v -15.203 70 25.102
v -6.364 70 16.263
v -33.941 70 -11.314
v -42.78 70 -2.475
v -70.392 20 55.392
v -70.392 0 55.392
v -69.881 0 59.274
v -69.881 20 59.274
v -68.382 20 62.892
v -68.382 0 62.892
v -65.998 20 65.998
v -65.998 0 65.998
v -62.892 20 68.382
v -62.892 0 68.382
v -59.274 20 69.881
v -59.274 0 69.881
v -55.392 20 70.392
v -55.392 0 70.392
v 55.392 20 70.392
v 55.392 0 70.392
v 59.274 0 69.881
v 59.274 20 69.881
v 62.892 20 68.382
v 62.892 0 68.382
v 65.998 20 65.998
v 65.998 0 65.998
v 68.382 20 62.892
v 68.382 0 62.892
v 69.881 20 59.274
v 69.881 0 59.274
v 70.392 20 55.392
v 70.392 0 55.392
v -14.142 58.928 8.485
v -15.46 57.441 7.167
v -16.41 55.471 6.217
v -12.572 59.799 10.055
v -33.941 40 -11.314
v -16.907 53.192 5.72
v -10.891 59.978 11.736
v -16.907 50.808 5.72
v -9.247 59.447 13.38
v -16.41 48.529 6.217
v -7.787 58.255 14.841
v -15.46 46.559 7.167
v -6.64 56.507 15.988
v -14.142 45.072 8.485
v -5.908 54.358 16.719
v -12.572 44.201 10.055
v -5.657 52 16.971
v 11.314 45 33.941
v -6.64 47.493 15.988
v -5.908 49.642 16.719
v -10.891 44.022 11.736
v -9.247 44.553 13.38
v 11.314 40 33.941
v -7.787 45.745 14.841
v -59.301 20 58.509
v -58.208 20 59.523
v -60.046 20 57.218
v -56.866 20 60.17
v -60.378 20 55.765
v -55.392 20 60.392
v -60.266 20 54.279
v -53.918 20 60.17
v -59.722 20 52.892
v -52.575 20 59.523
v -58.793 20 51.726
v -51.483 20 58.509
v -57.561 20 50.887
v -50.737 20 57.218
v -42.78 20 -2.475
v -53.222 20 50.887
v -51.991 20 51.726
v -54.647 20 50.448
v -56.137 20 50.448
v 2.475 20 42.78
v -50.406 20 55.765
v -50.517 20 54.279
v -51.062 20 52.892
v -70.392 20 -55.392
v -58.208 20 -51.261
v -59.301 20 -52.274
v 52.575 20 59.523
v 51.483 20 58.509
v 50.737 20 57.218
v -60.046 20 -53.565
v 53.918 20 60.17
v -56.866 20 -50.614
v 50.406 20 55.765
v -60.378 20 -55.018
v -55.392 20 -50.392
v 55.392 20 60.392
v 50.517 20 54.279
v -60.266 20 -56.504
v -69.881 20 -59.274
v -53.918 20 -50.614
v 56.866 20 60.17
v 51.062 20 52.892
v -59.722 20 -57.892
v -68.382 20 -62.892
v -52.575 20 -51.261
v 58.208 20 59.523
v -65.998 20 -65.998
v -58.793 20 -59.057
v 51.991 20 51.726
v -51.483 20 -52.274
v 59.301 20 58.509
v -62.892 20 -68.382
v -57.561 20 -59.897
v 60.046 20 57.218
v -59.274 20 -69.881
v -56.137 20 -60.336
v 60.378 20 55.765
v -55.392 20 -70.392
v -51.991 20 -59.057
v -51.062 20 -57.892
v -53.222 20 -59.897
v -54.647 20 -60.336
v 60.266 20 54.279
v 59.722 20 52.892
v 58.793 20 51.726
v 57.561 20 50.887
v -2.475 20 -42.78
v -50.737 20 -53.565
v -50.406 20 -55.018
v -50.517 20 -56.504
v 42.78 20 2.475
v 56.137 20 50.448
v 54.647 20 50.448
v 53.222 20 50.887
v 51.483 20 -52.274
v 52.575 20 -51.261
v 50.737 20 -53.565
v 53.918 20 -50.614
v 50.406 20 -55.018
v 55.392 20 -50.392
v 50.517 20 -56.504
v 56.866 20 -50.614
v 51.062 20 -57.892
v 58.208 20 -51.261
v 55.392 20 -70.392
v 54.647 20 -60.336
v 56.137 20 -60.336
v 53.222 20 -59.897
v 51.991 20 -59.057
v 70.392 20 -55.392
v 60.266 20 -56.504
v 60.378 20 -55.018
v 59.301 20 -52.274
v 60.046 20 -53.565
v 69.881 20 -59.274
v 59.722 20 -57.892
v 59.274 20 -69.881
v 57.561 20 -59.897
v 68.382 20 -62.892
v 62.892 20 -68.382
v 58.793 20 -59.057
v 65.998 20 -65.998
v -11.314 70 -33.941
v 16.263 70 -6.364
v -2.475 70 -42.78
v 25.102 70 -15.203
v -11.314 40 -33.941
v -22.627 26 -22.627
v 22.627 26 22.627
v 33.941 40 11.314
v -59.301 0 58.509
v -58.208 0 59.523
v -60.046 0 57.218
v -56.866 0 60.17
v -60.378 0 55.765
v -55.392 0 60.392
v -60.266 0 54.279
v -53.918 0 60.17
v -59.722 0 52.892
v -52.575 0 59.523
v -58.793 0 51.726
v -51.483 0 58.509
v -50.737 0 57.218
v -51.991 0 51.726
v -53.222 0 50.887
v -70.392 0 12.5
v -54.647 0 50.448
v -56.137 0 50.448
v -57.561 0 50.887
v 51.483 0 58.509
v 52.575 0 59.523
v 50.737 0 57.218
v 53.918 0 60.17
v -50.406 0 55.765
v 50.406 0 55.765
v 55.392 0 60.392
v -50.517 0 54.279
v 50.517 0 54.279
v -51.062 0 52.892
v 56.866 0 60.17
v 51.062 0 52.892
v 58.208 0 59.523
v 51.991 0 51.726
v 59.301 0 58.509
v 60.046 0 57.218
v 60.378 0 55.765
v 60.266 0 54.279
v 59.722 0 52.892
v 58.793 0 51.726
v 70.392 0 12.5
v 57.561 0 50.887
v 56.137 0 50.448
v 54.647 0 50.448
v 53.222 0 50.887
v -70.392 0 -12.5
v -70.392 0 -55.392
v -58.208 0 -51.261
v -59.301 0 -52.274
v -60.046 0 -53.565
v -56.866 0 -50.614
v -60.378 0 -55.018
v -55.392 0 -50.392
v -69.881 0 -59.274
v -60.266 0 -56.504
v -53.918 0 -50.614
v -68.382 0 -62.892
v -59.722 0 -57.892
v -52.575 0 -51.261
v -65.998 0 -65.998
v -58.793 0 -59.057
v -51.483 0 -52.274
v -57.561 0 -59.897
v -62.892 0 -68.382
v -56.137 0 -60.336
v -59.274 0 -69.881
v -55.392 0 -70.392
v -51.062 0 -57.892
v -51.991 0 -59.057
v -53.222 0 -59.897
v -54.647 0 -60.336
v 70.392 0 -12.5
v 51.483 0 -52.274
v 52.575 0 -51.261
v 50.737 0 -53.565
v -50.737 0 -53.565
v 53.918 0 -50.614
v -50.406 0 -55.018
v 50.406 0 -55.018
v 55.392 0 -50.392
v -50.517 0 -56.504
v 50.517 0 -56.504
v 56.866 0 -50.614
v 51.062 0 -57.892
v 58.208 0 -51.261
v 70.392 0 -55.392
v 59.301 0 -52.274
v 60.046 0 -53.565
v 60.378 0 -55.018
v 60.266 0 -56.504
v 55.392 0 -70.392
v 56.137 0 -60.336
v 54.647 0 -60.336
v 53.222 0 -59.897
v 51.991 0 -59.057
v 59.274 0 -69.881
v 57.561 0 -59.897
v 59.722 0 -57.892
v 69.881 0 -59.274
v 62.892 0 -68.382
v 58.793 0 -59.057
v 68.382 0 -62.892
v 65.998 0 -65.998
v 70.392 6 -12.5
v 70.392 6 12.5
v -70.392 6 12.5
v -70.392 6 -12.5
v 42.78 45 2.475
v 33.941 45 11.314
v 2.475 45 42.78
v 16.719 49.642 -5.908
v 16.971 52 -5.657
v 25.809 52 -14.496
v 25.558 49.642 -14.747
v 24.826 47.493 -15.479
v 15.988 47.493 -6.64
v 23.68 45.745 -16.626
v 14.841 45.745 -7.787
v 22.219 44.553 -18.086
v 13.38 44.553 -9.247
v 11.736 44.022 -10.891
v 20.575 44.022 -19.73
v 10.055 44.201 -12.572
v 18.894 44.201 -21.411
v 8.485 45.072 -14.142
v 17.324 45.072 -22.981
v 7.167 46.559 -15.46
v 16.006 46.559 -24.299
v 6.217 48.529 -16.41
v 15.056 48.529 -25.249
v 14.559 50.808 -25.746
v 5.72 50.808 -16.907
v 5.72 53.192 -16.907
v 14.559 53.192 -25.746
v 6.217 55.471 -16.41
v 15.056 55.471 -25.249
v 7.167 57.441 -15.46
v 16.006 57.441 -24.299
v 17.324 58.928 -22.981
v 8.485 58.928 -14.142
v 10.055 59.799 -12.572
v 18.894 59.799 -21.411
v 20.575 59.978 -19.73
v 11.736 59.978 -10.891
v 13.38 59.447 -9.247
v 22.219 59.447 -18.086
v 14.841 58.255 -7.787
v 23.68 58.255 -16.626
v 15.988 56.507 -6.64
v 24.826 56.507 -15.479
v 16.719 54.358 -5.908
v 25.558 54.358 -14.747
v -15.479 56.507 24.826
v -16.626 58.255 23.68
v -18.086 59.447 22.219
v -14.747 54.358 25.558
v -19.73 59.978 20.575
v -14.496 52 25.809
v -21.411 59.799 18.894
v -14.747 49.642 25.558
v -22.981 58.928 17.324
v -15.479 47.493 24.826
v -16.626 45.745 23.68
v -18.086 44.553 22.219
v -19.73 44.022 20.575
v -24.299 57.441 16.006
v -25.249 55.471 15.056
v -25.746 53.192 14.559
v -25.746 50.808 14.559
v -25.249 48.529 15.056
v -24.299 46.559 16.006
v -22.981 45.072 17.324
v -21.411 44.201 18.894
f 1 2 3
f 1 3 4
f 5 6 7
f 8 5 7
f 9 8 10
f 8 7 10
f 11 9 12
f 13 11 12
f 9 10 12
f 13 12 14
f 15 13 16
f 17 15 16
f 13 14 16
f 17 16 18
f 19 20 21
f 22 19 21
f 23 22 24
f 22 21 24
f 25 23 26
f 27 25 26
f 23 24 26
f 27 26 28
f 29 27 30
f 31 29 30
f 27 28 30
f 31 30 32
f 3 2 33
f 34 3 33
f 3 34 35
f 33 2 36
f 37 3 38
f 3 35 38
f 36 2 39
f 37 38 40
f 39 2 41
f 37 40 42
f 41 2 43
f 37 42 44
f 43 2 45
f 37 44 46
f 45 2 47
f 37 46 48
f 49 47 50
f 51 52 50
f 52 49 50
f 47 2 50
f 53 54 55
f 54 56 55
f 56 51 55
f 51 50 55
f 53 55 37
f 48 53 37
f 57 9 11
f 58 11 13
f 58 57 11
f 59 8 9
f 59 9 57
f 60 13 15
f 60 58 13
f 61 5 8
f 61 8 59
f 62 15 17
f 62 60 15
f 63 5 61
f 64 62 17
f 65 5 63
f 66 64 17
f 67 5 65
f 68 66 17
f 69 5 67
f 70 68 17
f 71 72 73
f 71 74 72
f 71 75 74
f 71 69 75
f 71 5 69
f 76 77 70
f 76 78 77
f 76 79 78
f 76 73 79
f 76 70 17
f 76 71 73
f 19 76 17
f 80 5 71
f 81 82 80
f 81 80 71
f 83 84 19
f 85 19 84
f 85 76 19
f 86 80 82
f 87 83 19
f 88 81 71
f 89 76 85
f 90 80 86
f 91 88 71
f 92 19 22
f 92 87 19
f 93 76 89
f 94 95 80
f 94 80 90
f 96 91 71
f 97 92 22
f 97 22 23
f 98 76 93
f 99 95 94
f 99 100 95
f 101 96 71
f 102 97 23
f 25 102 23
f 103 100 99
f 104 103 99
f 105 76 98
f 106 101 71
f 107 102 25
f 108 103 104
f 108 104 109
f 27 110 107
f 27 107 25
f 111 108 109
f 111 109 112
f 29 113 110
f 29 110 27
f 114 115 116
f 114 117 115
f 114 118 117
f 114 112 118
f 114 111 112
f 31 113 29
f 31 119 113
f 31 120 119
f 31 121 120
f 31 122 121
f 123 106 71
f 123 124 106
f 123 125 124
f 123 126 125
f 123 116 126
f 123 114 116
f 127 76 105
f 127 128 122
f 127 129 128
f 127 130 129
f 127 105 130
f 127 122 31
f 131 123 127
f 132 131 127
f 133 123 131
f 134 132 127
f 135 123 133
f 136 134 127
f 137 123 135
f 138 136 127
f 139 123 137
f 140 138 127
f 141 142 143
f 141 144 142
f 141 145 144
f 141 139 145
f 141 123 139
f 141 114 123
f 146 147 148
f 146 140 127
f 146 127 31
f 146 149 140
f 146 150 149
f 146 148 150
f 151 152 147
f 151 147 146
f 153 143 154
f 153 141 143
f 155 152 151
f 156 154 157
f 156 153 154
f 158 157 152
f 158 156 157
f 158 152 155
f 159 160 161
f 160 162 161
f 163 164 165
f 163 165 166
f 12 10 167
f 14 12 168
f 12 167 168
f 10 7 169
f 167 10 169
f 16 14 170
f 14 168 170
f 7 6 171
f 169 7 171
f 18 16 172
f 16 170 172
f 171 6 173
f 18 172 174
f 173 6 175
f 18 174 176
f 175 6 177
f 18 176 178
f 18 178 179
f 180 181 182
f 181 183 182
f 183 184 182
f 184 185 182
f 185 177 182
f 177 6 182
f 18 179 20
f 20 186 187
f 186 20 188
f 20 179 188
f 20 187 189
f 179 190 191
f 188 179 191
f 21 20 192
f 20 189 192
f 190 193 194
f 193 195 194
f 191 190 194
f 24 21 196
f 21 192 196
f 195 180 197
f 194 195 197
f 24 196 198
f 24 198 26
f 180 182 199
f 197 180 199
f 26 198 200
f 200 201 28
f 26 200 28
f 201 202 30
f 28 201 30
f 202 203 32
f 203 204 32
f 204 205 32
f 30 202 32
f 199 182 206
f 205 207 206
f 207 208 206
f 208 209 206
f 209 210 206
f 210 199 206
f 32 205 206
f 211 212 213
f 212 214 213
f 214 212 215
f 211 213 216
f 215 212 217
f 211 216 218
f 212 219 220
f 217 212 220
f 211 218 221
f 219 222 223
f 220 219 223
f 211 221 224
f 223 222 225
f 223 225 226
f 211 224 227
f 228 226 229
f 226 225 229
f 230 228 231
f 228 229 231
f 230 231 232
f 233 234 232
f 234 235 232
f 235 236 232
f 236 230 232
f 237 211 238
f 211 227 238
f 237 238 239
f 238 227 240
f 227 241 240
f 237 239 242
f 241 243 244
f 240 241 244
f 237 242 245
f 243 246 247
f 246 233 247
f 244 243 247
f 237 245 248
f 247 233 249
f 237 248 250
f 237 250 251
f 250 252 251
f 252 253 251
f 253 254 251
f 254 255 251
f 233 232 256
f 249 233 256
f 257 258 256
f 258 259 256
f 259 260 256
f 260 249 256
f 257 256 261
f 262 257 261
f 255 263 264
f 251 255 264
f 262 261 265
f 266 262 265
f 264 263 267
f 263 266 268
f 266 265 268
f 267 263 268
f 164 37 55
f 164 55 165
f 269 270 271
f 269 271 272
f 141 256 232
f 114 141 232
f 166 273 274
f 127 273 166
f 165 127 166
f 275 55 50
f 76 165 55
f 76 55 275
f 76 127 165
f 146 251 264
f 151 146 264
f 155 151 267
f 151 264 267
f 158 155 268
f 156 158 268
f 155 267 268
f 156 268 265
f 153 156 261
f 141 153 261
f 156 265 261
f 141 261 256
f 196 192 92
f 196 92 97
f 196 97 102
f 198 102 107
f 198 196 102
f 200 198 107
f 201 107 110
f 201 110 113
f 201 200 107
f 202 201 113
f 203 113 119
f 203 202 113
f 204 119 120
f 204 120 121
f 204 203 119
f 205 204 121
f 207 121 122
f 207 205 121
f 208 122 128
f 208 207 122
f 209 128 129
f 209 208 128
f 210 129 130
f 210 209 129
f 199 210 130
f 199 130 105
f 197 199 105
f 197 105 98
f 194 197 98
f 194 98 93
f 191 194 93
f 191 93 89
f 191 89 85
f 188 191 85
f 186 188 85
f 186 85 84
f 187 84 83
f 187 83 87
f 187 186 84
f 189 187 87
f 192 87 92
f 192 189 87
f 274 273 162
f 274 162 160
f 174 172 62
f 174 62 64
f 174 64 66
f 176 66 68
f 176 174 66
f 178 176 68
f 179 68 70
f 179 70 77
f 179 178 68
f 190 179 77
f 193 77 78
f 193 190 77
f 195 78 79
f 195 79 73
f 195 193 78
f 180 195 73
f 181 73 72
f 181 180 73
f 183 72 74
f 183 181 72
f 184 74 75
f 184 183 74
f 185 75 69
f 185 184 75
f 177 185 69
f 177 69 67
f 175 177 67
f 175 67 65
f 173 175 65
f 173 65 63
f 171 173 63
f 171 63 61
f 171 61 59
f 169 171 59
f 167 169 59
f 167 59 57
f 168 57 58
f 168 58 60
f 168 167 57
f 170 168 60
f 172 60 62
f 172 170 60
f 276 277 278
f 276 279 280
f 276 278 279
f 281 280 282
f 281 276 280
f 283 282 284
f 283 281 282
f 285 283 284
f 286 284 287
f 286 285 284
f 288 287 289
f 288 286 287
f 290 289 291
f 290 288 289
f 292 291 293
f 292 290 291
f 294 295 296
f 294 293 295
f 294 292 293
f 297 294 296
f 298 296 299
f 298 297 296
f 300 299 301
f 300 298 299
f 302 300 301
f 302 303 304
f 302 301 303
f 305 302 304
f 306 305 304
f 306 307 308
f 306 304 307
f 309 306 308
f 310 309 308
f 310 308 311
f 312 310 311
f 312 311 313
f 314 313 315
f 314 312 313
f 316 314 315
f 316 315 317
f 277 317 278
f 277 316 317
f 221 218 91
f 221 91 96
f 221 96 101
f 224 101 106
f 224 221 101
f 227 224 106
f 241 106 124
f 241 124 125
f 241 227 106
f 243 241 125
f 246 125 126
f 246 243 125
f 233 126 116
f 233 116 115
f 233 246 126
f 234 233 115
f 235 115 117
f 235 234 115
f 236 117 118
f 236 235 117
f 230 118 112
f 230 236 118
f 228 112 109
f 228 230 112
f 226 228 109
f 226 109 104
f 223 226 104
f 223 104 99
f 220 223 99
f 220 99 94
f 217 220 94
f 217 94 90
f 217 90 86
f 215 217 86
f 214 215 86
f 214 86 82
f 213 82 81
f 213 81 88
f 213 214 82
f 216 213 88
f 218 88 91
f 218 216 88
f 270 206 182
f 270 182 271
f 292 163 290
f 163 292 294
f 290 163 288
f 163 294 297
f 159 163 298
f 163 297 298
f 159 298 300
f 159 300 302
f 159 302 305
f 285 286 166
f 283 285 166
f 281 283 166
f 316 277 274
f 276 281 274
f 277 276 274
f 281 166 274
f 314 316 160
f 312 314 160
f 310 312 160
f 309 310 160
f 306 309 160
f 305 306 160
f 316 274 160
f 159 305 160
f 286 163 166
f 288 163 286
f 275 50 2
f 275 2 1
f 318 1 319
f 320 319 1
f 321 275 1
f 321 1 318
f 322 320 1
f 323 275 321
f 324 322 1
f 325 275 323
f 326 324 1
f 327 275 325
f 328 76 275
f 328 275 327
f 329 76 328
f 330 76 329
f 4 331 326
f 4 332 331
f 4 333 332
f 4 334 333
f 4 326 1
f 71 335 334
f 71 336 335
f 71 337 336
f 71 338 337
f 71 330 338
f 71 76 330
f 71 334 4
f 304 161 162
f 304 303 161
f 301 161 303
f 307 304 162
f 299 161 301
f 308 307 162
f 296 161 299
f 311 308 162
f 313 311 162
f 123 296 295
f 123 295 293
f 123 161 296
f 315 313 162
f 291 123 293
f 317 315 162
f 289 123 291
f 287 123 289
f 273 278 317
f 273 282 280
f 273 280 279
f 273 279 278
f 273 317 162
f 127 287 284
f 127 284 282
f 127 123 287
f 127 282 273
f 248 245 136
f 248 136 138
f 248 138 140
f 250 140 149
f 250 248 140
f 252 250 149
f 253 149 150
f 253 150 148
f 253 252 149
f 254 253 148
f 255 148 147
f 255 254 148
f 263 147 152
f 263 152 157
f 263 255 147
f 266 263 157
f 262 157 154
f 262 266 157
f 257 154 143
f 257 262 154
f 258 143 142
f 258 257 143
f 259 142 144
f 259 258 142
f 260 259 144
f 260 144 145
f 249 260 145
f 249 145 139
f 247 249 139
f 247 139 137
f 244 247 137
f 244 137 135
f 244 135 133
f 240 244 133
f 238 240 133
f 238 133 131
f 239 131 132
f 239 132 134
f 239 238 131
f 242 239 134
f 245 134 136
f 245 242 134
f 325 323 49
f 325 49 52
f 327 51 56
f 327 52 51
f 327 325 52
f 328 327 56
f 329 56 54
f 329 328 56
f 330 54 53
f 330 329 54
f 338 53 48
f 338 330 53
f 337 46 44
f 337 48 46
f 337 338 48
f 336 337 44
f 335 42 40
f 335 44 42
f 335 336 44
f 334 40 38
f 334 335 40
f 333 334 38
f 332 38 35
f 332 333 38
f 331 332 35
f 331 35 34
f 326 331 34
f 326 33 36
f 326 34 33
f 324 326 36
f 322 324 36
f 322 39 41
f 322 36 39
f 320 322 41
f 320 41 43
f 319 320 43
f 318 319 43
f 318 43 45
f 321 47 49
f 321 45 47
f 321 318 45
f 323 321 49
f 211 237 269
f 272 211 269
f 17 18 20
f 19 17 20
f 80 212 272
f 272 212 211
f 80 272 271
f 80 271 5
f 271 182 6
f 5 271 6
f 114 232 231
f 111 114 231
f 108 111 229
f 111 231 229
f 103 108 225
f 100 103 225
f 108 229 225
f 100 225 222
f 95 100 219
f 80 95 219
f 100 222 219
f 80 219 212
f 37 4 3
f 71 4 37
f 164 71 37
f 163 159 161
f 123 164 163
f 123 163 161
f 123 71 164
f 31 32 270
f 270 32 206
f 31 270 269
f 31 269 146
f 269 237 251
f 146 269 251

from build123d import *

# Parameters (mm, degrees)
SKETCH1_R               = 5
BOSS_EXTRUDE1_DEPTH     = 20
BOSS_EXTRUDE2_DEPTH     = 70
CUT_EXTRUDE1_DEPTH      = 146.933344284
CUT_EXTRUDE1_DEPTH_BACK = 146.933344284
SKETCH2_R               = 8
CUT_EXTRUDE2_DEPTH      = 150.013871252
CHAMFER1_SIZE           = 25
CUT_EXTRUDE3_REACH      = 174.264
SKETCH4_W               = 25
SKETCH4_H               = 12


with BuildPart() as part:
    # Sketch1 → Boss-Extrude1 (new body)
    with BuildSketch(Plane(origin=(0, 0, 0), x_dir=(1, 0, 0), z_dir=(0, 1, 0))):
        with BuildLine():
            ThreePointArc((-70.391757976, -55.391757976), (-65.998359694, -65.998359694), (-55.391757976, -70.391757976))
            Line((-55.391757976, -70.391757976), (55.391757976, -70.391757976))
            ThreePointArc((55.391757976, -70.391757976), (65.998359694, -65.998359694), (70.391757976, -55.391757976))
            Line((70.391757976, -55.391757976), (70.391757976, 55.391757976))
            ThreePointArc((70.391757976, 55.391757976), (65.998359694, 65.998359694), (55.391757976, 70.391757976))
            Line((55.391757976, 70.391757976), (-55.391757976, 70.391757976))
            ThreePointArc((-55.391757976, 70.391757976), (-65.998359694, 65.998359694), (-70.391757976, 55.391757976))
            Line((-70.391757976, 55.391757976), (-70.391757976, -55.391757976))
        make_face()
        with Locations((-55.391757976, -55.391757976)):
            Circle(SKETCH1_R, mode=Mode.SUBTRACT)
        with Locations((55.391757976, -55.391757976)):
            Circle(SKETCH1_R, mode=Mode.SUBTRACT)
        with Locations((-55.391757976, 55.391757976)):
            Circle(SKETCH1_R, mode=Mode.SUBTRACT)
        Polygon((42.779960262, -2.474873734), (2.474873734, -42.779960262), (-42.779960262, 2.474873734), (-2.474873734, 42.779960262), align=None, mode=Mode.SUBTRACT)
        with Locations((55.391757976, 55.391757976)):
            Circle(SKETCH1_R, mode=Mode.SUBTRACT)
    extrude(amount=BOSS_EXTRUDE1_DEPTH)

    # Sketch1<3> → Boss-Extrude2 (add)
    with BuildSketch(Plane(origin=(0, 0, 0), x_dir=(1, 0, 0), z_dir=(0, 1, 0))):
        Polygon((-42.779960262, 2.474873734), (2.474873734, -42.779960262), (42.779960262, -2.474873734), (-2.474873734, 42.779960262), align=None)
    extrude(amount=BOSS_EXTRUDE2_DEPTH)

    # Sketch2 → Cut-Extrude1 (cut, two sides: drawn at the far end of the back side and taken through both)
    with BuildSketch(Plane(origin=(20.152543264, 0, -20.152543264), x_dir=(-0.7071067811865475, 0, -0.7071067811865477), z_dir=(0.7071067811865477, 0, -0.7071067811865475)).offset(-CUT_EXTRUDE1_DEPTH_BACK)):
        with Locations((0, 52)):
            Circle(SKETCH2_R)
    extrude(amount=CUT_EXTRUDE1_DEPTH + CUT_EXTRUDE1_DEPTH_BACK, mode=Mode.SUBTRACT)

    # Sketch3 → Cut-Extrude2 (cut, through all)
    with BuildSketch(Plane(origin=(22.627416998, 0, 22.627416998), x_dir=(0.7071067811865475, 0, -0.7071067811865477), z_dir=(0.7071067811865477, 0, 0.7071067811865475))):
        Polygon((16, 40), (16, 70), (-16, 70), (-16, 40), (0, 26), align=None)
    extrude(amount=-CUT_EXTRUDE2_DEPTH, mode=Mode.SUBTRACT)

    # Chamfer1
    chamfer1_edges = [part.edges().sort_by_distance(p)[0] for p in [
        (6.894291117, 70, 38.360542879),
        (38.360542879, 70, 6.894291117),
    ]]
    chamfer(chamfer1_edges, length=CHAMFER1_SIZE)

    # Sketch4 → Cut-Extrude3 (cut, up to next)
    with BuildSketch(Plane(origin=(70.391757976, 0, 0), x_dir=(0, 0, -1), z_dir=(1, 0, 0)), mode=Mode.PRIVATE) as cut_extrude3_sk1:
        Rectangle(SKETCH4_W, SKETCH4_H)
    cut_extrude3_tool1 = extrude(cut_extrude3_sk1.sketch, amount=-CUT_EXTRUDE3_REACH, mode=Mode.PRIVATE) & part.part
    add(cut_extrude3_tool1.solids().sort_by_distance((70.391758, 0, 0))[0], mode=Mode.SUBTRACT)


solid = part.part
